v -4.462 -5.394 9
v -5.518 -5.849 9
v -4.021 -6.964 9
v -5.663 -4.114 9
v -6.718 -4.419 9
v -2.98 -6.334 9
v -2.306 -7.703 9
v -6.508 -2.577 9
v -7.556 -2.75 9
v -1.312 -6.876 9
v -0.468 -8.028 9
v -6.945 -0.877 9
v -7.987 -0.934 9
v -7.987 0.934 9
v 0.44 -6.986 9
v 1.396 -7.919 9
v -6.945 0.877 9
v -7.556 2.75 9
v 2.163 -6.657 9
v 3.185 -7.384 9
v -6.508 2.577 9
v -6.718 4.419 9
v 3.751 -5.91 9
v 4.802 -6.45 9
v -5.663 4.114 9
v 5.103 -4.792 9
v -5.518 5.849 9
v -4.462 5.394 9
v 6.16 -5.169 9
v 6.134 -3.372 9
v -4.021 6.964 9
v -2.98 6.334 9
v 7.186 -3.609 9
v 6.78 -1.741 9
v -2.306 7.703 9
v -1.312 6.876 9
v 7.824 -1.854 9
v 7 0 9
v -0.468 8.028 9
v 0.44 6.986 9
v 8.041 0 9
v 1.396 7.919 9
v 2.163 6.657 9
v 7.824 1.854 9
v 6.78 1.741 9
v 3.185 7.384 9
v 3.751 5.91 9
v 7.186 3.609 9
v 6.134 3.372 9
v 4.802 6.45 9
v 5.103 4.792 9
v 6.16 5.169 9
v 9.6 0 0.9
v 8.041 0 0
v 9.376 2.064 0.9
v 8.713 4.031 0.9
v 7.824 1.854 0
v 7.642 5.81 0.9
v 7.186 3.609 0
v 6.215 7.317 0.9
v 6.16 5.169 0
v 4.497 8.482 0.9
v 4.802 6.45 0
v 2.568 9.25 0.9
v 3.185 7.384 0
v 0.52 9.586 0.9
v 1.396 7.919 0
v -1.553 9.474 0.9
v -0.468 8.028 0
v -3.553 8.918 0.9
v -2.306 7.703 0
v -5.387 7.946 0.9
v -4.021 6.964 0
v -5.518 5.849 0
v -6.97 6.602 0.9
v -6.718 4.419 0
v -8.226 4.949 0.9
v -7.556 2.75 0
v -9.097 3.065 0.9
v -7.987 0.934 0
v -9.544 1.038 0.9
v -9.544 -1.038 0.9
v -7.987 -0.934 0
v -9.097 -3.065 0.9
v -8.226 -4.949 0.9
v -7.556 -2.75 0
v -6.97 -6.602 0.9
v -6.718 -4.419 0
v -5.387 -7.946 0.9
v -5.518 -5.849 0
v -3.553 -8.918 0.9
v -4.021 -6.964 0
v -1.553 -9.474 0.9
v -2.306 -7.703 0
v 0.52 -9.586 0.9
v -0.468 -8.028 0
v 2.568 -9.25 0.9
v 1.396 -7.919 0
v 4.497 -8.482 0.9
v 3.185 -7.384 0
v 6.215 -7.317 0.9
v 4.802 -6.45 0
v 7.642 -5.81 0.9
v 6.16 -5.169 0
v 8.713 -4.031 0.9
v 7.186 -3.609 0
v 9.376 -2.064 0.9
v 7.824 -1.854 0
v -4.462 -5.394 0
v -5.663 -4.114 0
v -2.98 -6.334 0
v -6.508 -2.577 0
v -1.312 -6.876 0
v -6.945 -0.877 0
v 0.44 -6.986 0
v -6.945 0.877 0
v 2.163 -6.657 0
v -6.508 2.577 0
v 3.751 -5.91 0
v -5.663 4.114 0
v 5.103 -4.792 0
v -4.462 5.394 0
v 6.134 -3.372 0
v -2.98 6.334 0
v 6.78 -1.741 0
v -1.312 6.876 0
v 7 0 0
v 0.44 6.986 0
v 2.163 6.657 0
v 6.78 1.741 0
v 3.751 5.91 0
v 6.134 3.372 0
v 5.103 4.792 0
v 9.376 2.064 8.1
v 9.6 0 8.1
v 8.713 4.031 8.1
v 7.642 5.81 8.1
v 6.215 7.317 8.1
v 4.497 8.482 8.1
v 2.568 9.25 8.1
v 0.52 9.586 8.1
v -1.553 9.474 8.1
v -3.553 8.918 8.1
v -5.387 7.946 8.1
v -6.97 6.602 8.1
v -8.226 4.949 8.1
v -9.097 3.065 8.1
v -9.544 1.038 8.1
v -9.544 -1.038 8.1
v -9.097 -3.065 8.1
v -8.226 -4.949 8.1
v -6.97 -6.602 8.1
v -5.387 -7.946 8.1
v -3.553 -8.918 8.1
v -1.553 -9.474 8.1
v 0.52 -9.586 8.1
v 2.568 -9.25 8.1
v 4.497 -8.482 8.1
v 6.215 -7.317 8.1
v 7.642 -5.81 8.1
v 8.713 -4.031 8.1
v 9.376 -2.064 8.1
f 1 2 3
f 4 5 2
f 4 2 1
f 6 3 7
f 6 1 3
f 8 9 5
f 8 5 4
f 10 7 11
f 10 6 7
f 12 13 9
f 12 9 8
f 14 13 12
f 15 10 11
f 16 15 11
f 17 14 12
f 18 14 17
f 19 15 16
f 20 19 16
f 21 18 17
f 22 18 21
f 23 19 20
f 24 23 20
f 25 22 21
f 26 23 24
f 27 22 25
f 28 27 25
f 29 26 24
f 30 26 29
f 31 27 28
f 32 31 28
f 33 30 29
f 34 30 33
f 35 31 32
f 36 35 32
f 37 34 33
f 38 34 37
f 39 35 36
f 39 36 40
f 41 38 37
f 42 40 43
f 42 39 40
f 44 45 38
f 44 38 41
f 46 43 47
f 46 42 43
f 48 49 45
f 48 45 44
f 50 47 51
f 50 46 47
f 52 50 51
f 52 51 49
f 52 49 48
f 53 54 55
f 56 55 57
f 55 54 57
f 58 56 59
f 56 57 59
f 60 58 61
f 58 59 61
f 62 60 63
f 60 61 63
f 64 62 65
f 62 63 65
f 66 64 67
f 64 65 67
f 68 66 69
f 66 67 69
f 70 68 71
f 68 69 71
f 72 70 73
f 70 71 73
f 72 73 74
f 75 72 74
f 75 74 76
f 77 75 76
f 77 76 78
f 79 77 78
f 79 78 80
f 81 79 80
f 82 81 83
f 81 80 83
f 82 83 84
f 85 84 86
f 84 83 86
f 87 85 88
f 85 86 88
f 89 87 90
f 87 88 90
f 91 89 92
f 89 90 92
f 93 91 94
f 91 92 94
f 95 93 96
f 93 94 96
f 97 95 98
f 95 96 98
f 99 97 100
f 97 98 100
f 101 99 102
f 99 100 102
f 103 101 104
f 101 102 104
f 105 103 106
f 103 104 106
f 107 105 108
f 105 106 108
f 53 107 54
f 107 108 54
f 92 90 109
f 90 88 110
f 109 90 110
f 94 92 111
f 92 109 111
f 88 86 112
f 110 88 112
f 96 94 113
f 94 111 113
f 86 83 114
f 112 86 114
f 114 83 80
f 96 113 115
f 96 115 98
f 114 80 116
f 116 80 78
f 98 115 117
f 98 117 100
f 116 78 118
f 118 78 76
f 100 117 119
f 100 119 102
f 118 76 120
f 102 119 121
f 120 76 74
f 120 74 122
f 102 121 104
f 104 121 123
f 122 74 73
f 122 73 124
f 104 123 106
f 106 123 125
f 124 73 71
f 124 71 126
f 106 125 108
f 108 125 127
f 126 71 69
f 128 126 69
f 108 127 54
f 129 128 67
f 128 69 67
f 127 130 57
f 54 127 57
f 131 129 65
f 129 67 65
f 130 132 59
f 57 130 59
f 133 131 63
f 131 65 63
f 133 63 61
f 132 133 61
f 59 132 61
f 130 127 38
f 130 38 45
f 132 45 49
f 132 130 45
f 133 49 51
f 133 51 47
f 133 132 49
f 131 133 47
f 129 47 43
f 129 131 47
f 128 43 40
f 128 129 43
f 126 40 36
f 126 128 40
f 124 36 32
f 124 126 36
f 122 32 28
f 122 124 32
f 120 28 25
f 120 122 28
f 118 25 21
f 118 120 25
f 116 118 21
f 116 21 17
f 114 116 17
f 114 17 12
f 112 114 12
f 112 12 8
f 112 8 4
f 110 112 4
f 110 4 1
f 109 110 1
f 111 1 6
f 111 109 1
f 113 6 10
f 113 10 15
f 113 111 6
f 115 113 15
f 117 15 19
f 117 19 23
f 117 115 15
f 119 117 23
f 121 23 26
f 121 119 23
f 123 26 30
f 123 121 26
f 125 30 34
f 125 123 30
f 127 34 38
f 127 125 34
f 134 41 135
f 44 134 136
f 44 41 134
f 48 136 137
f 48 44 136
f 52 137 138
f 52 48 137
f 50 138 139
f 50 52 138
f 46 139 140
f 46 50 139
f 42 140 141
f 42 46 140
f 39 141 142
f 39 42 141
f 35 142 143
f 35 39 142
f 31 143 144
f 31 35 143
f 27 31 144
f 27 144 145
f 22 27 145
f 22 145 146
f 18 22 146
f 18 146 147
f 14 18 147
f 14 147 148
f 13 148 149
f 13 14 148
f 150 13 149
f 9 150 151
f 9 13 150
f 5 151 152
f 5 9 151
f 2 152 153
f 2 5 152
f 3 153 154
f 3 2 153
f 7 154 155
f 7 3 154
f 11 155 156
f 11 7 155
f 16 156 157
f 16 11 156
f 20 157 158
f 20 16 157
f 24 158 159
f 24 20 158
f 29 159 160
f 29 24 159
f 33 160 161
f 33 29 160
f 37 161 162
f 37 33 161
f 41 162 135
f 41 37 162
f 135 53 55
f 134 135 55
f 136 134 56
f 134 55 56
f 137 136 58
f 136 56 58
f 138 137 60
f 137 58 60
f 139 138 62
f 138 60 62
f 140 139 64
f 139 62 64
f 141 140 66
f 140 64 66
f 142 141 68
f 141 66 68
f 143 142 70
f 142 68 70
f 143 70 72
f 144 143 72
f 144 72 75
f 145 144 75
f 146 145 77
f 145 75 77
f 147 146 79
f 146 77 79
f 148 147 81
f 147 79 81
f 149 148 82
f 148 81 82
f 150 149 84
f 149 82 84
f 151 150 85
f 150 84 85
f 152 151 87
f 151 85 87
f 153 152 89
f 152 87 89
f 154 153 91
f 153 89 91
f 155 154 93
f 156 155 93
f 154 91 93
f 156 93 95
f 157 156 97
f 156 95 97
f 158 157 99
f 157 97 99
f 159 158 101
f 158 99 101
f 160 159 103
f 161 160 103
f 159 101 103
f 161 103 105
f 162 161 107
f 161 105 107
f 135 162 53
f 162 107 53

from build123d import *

# Parameters (mm, degrees)
ESQUISSE1_R        = 9.6
ESQUISSE1_R_2      = 7
BOSS_EXTRU_1_DEPTH = 9
CHANFREIN5_SIZE    = 0.9
CHANFREIN5_SIZE2   = 1.558845727
CHANFREIN9_SIZE    = 0.9
CHANFREIN9_SIZE2   = 1.558845727


with BuildPart() as part:
    # Esquisse1 → Boss.-Extru.1 (new body)
    with BuildSketch(Plane.XY):
        Circle(ESQUISSE1_R)
        Circle(ESQUISSE1_R_2, mode=Mode.SUBTRACT)
    extrude(amount=BOSS_EXTRU_1_DEPTH)

    # Chanfrein5
    chanfrein5_edges = [part.edges().sort_by_distance(p)[0] for p in [
        (-9.6, 0, 9),
    ]]
    chanfrein5_side = [part.faces().sort_by_distance(p)[0] for p in [
        (-9.6, 0, 4.5),
    ]]
    chamfer(chanfrein5_edges, length=CHANFREIN5_SIZE, length2=CHANFREIN5_SIZE2, reference=chanfrein5_side[0])

    # Chanfrein9
    chanfrein9_edges = [part.edges().sort_by_distance(p)[0] for p in [
        (-9.6, 0, 0),
    ]]
    chanfrein9_side = [part.faces().sort_by_distance(p)[0] for p in [
        (-9.6, 0, 4.05),
    ]]
    chamfer(chanfrein9_edges, length=CHANFREIN9_SIZE, length2=CHANFREIN9_SIZE2, reference=chanfrein9_side[0])


solid = part.part
